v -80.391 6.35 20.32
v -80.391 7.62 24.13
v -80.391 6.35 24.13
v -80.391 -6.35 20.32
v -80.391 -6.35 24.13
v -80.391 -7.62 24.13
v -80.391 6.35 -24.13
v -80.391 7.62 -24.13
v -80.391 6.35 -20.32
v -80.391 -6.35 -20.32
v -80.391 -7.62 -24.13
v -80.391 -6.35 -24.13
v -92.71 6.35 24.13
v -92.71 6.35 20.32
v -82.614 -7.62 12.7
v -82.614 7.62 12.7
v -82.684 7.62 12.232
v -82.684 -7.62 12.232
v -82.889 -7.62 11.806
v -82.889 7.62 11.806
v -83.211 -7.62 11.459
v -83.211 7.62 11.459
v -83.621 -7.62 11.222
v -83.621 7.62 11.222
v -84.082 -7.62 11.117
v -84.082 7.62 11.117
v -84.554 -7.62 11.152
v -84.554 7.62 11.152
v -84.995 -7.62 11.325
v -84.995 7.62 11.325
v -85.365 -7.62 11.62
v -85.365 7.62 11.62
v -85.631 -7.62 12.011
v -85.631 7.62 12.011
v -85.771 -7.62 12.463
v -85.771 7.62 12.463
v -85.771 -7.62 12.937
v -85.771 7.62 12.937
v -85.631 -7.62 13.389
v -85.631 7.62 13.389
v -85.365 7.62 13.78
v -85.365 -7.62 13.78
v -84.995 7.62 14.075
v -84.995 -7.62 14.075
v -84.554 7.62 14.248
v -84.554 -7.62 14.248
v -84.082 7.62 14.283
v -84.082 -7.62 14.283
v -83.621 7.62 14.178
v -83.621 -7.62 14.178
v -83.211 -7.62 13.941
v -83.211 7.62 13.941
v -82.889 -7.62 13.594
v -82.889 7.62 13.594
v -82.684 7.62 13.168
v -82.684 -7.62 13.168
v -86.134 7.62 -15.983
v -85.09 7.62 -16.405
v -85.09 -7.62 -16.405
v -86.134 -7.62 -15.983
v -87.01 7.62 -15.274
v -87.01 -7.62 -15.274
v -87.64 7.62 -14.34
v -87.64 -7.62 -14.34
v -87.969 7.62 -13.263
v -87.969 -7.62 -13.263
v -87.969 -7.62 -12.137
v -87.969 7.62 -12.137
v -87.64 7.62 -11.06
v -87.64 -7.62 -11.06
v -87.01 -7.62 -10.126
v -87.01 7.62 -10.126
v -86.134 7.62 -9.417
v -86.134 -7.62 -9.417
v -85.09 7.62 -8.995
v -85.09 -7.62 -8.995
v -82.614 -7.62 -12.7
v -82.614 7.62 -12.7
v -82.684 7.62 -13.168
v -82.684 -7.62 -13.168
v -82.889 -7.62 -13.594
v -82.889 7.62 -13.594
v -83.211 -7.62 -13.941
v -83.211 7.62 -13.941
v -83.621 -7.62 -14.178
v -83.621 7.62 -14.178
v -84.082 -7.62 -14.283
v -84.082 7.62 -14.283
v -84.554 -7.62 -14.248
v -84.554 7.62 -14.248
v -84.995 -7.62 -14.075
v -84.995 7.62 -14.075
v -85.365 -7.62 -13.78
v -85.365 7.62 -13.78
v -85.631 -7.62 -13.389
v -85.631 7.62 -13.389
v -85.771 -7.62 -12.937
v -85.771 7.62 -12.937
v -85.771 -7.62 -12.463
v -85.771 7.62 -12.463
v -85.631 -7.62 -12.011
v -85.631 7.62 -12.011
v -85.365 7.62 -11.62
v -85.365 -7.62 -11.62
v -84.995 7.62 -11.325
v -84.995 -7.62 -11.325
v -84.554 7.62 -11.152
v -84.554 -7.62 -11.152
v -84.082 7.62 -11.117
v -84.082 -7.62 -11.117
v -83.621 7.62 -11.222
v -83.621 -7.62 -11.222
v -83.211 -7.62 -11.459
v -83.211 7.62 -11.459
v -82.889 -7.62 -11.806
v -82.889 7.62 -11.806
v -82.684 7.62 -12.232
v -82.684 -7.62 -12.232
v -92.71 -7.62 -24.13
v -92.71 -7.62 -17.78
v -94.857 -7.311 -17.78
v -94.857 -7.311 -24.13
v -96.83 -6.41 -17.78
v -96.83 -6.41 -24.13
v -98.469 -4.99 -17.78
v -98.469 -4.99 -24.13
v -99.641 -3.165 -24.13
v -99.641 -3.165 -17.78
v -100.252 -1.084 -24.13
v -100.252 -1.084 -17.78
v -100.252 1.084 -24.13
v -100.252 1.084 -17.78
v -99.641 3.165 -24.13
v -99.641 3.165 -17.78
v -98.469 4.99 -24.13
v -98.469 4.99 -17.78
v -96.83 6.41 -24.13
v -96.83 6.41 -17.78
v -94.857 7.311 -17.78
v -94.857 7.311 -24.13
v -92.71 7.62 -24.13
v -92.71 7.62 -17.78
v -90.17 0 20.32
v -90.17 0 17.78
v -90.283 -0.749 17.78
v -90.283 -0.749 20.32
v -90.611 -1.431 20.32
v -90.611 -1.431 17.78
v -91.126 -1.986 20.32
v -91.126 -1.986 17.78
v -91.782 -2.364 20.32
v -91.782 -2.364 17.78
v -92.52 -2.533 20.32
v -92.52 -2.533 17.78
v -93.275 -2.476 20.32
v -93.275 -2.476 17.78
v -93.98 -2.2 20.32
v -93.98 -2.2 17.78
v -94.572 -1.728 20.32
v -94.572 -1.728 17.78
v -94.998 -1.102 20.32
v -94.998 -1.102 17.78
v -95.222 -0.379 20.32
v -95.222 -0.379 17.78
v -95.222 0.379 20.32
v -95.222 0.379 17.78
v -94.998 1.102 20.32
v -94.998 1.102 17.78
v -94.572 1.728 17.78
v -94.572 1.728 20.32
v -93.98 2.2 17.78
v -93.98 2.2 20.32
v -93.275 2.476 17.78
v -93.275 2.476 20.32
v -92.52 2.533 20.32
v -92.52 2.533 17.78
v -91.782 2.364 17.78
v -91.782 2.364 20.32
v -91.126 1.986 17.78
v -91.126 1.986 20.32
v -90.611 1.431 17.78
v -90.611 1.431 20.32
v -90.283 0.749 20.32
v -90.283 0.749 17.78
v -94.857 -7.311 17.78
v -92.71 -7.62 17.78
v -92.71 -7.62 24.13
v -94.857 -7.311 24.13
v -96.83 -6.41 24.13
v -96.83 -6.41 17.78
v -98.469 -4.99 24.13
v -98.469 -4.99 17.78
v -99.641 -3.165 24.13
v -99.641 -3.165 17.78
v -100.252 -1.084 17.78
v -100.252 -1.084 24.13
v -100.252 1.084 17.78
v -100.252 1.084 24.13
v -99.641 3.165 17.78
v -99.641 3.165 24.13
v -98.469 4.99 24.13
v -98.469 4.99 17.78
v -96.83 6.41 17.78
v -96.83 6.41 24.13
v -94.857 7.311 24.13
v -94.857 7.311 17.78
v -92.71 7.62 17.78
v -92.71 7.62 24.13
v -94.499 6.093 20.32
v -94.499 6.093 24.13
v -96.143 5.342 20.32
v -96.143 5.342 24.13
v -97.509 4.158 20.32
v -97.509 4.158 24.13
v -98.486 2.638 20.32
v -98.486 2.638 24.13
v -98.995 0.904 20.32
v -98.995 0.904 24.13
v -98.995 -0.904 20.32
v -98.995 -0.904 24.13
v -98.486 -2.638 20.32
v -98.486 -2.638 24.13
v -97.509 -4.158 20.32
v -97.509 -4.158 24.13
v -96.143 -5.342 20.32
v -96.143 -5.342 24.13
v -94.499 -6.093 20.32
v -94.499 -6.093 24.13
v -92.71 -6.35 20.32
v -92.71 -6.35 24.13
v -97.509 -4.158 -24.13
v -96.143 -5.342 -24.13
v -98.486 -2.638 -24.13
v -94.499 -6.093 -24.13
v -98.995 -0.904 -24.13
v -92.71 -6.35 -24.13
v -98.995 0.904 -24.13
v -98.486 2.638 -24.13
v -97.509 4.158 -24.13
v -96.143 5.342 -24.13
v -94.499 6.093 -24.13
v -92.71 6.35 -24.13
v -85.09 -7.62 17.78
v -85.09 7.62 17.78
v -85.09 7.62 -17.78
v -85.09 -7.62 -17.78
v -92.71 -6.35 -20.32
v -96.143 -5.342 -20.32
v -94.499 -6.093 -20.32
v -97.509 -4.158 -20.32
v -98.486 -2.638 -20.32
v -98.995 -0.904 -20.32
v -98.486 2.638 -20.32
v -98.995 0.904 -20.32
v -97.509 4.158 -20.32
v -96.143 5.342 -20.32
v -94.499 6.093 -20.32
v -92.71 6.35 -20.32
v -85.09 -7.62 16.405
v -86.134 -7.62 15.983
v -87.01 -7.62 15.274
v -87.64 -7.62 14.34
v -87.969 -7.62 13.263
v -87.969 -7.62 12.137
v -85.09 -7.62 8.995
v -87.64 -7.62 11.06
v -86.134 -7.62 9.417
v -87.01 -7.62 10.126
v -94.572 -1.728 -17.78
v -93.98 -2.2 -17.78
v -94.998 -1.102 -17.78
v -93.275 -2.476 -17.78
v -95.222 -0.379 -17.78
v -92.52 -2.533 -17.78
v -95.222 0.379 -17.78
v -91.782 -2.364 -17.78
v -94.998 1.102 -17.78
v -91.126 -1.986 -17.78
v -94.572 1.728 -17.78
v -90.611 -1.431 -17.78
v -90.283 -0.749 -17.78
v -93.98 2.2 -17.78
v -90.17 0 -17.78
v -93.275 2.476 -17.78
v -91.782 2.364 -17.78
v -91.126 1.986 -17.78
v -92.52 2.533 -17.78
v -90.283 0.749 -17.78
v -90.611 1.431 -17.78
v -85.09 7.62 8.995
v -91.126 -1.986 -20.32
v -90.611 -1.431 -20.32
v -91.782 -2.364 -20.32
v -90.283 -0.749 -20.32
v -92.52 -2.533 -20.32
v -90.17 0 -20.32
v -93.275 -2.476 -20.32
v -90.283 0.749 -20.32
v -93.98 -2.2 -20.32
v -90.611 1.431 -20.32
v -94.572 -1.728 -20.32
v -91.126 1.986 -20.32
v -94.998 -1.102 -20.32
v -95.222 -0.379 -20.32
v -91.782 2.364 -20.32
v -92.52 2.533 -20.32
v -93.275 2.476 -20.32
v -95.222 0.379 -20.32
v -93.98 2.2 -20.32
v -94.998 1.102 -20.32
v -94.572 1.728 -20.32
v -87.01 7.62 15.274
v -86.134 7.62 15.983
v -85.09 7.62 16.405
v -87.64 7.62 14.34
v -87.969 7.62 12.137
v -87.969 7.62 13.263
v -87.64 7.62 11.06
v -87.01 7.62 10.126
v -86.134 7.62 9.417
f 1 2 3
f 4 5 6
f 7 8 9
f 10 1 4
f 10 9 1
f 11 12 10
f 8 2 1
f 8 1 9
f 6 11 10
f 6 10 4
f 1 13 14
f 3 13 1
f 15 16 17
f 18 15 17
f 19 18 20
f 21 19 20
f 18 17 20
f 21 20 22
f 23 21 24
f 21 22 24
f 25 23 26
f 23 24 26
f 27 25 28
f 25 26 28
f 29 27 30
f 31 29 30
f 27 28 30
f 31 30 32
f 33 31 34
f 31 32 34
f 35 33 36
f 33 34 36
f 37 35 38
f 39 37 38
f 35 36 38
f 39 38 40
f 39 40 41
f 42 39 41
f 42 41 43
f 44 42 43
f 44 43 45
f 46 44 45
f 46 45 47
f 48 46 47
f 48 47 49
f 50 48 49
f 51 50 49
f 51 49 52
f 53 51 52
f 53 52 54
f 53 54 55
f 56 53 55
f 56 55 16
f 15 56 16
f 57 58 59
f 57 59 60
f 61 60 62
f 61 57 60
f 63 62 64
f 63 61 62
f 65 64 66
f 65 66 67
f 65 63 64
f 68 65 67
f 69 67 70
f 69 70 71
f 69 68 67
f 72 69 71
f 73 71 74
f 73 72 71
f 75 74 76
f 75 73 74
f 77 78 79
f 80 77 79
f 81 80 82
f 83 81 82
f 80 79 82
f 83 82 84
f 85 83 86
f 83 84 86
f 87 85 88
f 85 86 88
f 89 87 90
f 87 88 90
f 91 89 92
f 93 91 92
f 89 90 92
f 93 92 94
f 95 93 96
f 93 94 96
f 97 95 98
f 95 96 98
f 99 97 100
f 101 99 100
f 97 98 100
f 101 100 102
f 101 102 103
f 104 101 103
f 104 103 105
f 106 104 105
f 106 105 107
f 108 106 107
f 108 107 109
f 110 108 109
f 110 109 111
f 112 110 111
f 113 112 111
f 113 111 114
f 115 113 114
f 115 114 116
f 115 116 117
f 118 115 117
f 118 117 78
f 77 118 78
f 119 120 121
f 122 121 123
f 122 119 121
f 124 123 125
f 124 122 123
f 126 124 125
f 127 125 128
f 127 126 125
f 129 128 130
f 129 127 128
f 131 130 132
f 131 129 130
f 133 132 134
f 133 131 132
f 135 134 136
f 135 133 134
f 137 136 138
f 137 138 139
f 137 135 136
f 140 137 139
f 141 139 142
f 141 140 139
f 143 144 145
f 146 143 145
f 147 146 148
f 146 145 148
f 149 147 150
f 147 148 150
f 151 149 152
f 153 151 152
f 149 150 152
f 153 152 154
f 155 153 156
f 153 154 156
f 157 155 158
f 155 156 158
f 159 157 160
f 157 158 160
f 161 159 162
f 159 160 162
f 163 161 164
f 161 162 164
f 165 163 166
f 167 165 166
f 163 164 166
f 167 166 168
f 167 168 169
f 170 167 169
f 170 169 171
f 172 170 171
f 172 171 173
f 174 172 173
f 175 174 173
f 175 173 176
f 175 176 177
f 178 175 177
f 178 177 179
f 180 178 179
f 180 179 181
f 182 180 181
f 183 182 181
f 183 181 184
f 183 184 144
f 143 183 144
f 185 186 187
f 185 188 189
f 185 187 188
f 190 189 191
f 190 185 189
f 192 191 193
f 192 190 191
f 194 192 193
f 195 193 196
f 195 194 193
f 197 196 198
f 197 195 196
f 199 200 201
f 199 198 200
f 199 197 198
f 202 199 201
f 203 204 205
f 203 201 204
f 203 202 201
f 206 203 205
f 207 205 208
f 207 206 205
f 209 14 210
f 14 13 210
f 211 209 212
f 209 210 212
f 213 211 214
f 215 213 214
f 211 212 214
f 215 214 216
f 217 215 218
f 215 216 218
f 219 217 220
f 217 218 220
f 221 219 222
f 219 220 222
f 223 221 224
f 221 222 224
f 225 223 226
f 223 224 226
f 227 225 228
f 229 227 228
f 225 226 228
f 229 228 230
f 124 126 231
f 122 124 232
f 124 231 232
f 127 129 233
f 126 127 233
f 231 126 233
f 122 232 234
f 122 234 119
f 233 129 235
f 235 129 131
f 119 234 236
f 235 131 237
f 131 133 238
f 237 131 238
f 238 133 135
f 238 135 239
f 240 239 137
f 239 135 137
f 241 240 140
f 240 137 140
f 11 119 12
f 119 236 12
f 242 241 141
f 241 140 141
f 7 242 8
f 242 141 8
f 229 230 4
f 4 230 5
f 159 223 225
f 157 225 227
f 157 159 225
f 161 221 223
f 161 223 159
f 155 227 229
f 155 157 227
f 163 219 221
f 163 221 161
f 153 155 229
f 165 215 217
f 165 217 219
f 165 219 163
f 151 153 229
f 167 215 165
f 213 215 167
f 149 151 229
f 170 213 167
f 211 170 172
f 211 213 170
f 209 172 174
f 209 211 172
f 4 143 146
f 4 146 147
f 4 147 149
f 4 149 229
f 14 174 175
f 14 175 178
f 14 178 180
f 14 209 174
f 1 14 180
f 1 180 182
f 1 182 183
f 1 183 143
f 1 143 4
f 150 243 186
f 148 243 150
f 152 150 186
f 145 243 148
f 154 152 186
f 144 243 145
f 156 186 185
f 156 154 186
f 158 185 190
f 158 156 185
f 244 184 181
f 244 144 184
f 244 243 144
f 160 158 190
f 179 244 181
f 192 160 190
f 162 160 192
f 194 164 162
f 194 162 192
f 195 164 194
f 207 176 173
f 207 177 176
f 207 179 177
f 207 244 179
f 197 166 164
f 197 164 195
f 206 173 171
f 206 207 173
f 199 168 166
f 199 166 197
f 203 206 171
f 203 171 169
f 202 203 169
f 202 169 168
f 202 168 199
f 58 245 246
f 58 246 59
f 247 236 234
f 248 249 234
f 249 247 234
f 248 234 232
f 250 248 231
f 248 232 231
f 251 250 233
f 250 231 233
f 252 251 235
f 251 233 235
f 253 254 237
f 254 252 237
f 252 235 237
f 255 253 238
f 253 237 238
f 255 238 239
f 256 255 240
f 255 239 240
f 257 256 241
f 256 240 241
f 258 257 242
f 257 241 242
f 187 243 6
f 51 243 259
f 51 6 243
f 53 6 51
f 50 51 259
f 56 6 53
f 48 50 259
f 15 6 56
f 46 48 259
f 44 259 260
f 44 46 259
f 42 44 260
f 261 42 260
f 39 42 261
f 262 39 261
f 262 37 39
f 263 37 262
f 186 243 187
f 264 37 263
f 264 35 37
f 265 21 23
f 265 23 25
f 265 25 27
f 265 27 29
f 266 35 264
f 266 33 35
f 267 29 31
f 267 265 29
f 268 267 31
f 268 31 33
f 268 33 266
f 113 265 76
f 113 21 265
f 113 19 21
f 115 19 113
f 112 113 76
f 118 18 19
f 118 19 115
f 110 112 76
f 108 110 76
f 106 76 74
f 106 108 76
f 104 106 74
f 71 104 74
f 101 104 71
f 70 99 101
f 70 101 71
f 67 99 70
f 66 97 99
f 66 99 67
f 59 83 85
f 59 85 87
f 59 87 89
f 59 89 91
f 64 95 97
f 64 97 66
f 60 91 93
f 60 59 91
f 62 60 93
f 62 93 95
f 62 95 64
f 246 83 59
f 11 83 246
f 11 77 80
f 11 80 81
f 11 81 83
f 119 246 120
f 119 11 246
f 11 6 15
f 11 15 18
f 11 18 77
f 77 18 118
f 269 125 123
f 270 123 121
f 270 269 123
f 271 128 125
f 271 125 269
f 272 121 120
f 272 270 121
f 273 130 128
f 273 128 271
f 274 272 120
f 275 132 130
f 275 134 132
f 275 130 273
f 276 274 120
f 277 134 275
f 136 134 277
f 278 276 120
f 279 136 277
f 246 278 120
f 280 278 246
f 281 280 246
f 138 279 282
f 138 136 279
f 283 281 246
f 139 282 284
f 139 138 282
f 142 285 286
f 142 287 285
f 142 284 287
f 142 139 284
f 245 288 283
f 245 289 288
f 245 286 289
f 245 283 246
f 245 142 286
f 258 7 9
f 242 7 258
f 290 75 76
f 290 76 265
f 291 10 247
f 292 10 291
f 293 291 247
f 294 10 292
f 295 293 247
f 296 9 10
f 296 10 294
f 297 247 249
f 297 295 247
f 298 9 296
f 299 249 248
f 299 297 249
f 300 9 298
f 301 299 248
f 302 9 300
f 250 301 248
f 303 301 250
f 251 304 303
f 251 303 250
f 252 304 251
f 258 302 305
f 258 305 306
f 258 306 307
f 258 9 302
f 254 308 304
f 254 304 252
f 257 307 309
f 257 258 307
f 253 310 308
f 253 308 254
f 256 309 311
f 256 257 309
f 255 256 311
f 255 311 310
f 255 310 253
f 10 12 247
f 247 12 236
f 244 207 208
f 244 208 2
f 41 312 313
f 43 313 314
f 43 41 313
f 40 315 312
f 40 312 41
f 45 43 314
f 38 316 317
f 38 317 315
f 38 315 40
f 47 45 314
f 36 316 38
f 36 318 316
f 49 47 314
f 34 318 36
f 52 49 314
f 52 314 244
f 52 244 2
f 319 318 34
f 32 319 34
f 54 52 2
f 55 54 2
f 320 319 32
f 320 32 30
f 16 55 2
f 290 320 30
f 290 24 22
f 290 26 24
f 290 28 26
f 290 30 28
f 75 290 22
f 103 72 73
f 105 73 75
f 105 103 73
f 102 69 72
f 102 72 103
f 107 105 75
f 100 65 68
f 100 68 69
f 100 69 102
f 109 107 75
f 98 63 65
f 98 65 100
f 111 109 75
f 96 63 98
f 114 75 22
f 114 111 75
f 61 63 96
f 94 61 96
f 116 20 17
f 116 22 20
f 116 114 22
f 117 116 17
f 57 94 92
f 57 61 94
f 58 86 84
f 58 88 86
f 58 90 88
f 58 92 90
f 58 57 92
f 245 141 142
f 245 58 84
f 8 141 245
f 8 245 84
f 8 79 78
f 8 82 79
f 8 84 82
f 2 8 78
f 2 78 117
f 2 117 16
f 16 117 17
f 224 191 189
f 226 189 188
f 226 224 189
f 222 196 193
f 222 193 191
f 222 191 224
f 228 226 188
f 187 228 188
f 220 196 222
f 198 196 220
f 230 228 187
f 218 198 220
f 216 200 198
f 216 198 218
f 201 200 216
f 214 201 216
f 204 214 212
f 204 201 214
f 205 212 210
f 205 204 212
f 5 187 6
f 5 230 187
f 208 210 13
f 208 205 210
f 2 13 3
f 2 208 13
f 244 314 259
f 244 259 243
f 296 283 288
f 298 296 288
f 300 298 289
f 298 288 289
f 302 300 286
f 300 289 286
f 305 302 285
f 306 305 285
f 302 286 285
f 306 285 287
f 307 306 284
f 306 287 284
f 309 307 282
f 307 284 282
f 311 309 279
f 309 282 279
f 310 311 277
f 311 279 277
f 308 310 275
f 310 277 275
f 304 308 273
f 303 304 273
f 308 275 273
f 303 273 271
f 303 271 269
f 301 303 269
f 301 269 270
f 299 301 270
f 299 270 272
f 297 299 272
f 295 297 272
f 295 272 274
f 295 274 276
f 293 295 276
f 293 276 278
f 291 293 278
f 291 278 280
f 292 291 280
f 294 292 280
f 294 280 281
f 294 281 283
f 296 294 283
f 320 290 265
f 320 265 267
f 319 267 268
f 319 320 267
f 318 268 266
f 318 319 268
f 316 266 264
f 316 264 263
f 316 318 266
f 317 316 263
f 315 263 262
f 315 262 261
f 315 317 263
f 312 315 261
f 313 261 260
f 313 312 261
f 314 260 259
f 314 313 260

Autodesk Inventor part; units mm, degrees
ref_plane "YZ Plane" through (0, 0, 0) normal (1, 0, 0) x (0, 1, 0)
ref_plane "XZ Plane" through (0, 0, 0) normal (0, 1, 0) x (-1, 0, 0)
ref_plane "XY Plane" through (0, 0, 0) normal (0, 0, 1) x (1, 0, 0)
sketch "Sketch1" plane through (0, 0, 0) normal (0, 0, 1) x (1, 0, 0)
  line L0 (-79.121, 7.62) -> (-79.121, -7.62) projected
  line L1 (-79.121, -7.62) -> (-84.201, -7.62) projected
  line L2 (-84.201, 7.62) -> (-79.121, 7.62) projected
  line L3 (-80.391, -7.62) -> (-92.71, -7.62)
  line L4 (-92.71, -7.62) -> (-92.71, 7.62) construction
  line L5 (-92.71, 7.62) -> (-80.391, 7.62)
  line L6 (-80.391, 7.62) -> (-80.391, -7.62)
  arc A0 (-92.71, 7.62) -> (-92.71, -7.62) centre (-92.71, 0) ccw
  arc A1 (-92.71, -7.62) -> (-92.71, 7.62) centre (-92.71, 0) ccw construction
  line L7 (-92.71, 0) -> (-100.33, 0) construction
  point P0 (0, 0)
  dimension "d0" = 1.27
  dimension "d1" = 19.939
extrude "Extrusion1" add sketch "Sketch1" along normal mid plane 48.26 contours L6 L1 L3 A0 L5 L2
sketch "Sketch2" plane through (-92.71, 7.62, 24.13) normal (0, 1, 0) x (1, 0, 0)
  circle A0 centre (8.509, 11.43) radius 1.5875 projected
  circle A1 centre (8.509, 36.83) radius 1.5875 projected
  circle A2 centre (8.509, 11.43) radius 1.5875
  circle A3 centre (8.509, 36.83) radius 1.5875
  point P0 (92.71, 24.13)
extrude "Extrusion2" cut sketch "Sketch2" against normal through all
sketch "Sketch3" plane through (-92.71, 7.62, 24.13) normal (0, 1, 0) x (1, 0, 0)
  line L0 (0, 48.26) -> (-7.62, 48.26) projected
  line L1 (0, 48.26) -> (12.319, 48.26) projected
  line L2 (-7.62, 0) -> (0, 0) projected
  line L3 (12.319, 0) -> (0, 0) projected
  circle A0 centre (8.509, 11.43) radius 1.5875 projected
  circle A1 centre (8.509, 36.83) radius 1.5875 projected
  line L4 (12.319, 48.26) -> (12.319, 0) projected
  arc A2 (7.62, 15.1348) -> (7.62, 7.7252) centre (8.509, 11.43) ccw
  circle A3 centre (8.509, 36.83) radius 1.5875 projected
  arc A4 (7.62, 40.5348) -> (7.62, 33.1252) centre (8.509, 36.83) ccw
  line L5 (-7.62, 48.26) -> (-7.62, 0) projected
  line L6 (-7.62, 24.13) -> (12.319, 24.13) construction
  line L7 (-7.62, 41.91) -> (7.62, 41.91)
  line L8 (7.62, 41.91) -> (7.62, 40.5348)
  line L9 (7.62, 6.35) -> (-7.62, 6.35)
  line L10 (-7.62, 6.35) -> (-7.62, 41.91)
  line L11 (-7.62, 41.91) -> (7.62, 6.35) construction
  line L12 (7.62, 41.91) -> (-7.62, 6.35) construction
  line L13 (7.62, 40.5348) -> (7.62, 33.1252) construction
  arc A5 (12.319, 36.83) -> (7.62, 40.5348) centre (8.509, 36.83) ccw construction
  arc A6 (7.62, 33.1252) -> (12.319, 36.83) centre (8.509, 36.83) ccw construction
  line L14 (7.62, 33.1252) -> (7.62, 15.1348)
  line L15 (7.62, 15.1348) -> (7.62, 7.7252) construction
  arc A7 (12.319, 11.43) -> (7.62, 15.1348) centre (8.509, 11.43) ccw construction
  arc A8 (7.62, 7.7252) -> (12.319, 11.43) centre (8.509, 11.43) ccw construction
  line L16 (7.62, 7.7252) -> (7.62, 6.35)
  point P0 (92.71, 24.13)
  point P1 (0, 24.13)
  dimension "d17" = 35.56
  dimension "d18" = 15.24
extrude "Extrusion3" cut sketch "Sketch3" against normal through all contours L7 L8 A4 L14 A2 L16 L9 L5
sketch "Sketch4" plane through (0, 0, 0) normal (0, 0, 1) x (1, 0, 0)
  arc A0 (-92.71, 7.62) -> (-92.71, -7.62) centre (-92.71, 0) ccw projected
  circle A1 centre (-92.71, 0) radius 2.54
  point P0 (0, 0)
  dimension "d11" = 5.08
extrude "Extrusion4" cut sketch "Sketch4" along normal mid plane 43.18
sketch "Sketch5" plane through (0, 0, 24.13) normal (0, 0, 1) x (1, 0, 0)
  line L0 (-80.391, -7.62) -> (-80.391, 7.62) projected
  line L1 (-80.391, 7.62) -> (-92.71, 7.62) projected
  arc A0 (-92.71, 7.62) -> (-92.71, -7.62) centre (-92.71, 0) ccw projected
  line L2 (-92.71, -7.62) -> (-80.391, -7.62) projected
  arc A1 (-92.71, 6.35) -> (-92.71, -6.35) centre (-92.71, 0) ccw
  line L3 (-92.71, 6.35) -> (-81.661, 6.35)
  line L4 (-81.661, 6.35) -> (-81.661, -6.35) construction
  line L5 (-81.661, -6.35) -> (-92.71, -6.35)
  line L6 (-81.661, 6.35) -> (-80.391, 6.35)
  line L7 (-81.661, -6.35) -> (-80.391, -6.35)
  line L8 (-80.391, 7.62) -> (-80.391, -7.62) projected
  point P0 (0, 0)
  dimension "d14" = 1.27
extrude "Extrusion5" cut sketch "Sketch5" against normal blind 3.81 contours L7 L5 A1 L3 L6 L0
mirror "Mirror1" about plane through (0, 0, 0) normal (0, 0, 1) of "Extrusion5"
properties part number "Steering_Arm"
